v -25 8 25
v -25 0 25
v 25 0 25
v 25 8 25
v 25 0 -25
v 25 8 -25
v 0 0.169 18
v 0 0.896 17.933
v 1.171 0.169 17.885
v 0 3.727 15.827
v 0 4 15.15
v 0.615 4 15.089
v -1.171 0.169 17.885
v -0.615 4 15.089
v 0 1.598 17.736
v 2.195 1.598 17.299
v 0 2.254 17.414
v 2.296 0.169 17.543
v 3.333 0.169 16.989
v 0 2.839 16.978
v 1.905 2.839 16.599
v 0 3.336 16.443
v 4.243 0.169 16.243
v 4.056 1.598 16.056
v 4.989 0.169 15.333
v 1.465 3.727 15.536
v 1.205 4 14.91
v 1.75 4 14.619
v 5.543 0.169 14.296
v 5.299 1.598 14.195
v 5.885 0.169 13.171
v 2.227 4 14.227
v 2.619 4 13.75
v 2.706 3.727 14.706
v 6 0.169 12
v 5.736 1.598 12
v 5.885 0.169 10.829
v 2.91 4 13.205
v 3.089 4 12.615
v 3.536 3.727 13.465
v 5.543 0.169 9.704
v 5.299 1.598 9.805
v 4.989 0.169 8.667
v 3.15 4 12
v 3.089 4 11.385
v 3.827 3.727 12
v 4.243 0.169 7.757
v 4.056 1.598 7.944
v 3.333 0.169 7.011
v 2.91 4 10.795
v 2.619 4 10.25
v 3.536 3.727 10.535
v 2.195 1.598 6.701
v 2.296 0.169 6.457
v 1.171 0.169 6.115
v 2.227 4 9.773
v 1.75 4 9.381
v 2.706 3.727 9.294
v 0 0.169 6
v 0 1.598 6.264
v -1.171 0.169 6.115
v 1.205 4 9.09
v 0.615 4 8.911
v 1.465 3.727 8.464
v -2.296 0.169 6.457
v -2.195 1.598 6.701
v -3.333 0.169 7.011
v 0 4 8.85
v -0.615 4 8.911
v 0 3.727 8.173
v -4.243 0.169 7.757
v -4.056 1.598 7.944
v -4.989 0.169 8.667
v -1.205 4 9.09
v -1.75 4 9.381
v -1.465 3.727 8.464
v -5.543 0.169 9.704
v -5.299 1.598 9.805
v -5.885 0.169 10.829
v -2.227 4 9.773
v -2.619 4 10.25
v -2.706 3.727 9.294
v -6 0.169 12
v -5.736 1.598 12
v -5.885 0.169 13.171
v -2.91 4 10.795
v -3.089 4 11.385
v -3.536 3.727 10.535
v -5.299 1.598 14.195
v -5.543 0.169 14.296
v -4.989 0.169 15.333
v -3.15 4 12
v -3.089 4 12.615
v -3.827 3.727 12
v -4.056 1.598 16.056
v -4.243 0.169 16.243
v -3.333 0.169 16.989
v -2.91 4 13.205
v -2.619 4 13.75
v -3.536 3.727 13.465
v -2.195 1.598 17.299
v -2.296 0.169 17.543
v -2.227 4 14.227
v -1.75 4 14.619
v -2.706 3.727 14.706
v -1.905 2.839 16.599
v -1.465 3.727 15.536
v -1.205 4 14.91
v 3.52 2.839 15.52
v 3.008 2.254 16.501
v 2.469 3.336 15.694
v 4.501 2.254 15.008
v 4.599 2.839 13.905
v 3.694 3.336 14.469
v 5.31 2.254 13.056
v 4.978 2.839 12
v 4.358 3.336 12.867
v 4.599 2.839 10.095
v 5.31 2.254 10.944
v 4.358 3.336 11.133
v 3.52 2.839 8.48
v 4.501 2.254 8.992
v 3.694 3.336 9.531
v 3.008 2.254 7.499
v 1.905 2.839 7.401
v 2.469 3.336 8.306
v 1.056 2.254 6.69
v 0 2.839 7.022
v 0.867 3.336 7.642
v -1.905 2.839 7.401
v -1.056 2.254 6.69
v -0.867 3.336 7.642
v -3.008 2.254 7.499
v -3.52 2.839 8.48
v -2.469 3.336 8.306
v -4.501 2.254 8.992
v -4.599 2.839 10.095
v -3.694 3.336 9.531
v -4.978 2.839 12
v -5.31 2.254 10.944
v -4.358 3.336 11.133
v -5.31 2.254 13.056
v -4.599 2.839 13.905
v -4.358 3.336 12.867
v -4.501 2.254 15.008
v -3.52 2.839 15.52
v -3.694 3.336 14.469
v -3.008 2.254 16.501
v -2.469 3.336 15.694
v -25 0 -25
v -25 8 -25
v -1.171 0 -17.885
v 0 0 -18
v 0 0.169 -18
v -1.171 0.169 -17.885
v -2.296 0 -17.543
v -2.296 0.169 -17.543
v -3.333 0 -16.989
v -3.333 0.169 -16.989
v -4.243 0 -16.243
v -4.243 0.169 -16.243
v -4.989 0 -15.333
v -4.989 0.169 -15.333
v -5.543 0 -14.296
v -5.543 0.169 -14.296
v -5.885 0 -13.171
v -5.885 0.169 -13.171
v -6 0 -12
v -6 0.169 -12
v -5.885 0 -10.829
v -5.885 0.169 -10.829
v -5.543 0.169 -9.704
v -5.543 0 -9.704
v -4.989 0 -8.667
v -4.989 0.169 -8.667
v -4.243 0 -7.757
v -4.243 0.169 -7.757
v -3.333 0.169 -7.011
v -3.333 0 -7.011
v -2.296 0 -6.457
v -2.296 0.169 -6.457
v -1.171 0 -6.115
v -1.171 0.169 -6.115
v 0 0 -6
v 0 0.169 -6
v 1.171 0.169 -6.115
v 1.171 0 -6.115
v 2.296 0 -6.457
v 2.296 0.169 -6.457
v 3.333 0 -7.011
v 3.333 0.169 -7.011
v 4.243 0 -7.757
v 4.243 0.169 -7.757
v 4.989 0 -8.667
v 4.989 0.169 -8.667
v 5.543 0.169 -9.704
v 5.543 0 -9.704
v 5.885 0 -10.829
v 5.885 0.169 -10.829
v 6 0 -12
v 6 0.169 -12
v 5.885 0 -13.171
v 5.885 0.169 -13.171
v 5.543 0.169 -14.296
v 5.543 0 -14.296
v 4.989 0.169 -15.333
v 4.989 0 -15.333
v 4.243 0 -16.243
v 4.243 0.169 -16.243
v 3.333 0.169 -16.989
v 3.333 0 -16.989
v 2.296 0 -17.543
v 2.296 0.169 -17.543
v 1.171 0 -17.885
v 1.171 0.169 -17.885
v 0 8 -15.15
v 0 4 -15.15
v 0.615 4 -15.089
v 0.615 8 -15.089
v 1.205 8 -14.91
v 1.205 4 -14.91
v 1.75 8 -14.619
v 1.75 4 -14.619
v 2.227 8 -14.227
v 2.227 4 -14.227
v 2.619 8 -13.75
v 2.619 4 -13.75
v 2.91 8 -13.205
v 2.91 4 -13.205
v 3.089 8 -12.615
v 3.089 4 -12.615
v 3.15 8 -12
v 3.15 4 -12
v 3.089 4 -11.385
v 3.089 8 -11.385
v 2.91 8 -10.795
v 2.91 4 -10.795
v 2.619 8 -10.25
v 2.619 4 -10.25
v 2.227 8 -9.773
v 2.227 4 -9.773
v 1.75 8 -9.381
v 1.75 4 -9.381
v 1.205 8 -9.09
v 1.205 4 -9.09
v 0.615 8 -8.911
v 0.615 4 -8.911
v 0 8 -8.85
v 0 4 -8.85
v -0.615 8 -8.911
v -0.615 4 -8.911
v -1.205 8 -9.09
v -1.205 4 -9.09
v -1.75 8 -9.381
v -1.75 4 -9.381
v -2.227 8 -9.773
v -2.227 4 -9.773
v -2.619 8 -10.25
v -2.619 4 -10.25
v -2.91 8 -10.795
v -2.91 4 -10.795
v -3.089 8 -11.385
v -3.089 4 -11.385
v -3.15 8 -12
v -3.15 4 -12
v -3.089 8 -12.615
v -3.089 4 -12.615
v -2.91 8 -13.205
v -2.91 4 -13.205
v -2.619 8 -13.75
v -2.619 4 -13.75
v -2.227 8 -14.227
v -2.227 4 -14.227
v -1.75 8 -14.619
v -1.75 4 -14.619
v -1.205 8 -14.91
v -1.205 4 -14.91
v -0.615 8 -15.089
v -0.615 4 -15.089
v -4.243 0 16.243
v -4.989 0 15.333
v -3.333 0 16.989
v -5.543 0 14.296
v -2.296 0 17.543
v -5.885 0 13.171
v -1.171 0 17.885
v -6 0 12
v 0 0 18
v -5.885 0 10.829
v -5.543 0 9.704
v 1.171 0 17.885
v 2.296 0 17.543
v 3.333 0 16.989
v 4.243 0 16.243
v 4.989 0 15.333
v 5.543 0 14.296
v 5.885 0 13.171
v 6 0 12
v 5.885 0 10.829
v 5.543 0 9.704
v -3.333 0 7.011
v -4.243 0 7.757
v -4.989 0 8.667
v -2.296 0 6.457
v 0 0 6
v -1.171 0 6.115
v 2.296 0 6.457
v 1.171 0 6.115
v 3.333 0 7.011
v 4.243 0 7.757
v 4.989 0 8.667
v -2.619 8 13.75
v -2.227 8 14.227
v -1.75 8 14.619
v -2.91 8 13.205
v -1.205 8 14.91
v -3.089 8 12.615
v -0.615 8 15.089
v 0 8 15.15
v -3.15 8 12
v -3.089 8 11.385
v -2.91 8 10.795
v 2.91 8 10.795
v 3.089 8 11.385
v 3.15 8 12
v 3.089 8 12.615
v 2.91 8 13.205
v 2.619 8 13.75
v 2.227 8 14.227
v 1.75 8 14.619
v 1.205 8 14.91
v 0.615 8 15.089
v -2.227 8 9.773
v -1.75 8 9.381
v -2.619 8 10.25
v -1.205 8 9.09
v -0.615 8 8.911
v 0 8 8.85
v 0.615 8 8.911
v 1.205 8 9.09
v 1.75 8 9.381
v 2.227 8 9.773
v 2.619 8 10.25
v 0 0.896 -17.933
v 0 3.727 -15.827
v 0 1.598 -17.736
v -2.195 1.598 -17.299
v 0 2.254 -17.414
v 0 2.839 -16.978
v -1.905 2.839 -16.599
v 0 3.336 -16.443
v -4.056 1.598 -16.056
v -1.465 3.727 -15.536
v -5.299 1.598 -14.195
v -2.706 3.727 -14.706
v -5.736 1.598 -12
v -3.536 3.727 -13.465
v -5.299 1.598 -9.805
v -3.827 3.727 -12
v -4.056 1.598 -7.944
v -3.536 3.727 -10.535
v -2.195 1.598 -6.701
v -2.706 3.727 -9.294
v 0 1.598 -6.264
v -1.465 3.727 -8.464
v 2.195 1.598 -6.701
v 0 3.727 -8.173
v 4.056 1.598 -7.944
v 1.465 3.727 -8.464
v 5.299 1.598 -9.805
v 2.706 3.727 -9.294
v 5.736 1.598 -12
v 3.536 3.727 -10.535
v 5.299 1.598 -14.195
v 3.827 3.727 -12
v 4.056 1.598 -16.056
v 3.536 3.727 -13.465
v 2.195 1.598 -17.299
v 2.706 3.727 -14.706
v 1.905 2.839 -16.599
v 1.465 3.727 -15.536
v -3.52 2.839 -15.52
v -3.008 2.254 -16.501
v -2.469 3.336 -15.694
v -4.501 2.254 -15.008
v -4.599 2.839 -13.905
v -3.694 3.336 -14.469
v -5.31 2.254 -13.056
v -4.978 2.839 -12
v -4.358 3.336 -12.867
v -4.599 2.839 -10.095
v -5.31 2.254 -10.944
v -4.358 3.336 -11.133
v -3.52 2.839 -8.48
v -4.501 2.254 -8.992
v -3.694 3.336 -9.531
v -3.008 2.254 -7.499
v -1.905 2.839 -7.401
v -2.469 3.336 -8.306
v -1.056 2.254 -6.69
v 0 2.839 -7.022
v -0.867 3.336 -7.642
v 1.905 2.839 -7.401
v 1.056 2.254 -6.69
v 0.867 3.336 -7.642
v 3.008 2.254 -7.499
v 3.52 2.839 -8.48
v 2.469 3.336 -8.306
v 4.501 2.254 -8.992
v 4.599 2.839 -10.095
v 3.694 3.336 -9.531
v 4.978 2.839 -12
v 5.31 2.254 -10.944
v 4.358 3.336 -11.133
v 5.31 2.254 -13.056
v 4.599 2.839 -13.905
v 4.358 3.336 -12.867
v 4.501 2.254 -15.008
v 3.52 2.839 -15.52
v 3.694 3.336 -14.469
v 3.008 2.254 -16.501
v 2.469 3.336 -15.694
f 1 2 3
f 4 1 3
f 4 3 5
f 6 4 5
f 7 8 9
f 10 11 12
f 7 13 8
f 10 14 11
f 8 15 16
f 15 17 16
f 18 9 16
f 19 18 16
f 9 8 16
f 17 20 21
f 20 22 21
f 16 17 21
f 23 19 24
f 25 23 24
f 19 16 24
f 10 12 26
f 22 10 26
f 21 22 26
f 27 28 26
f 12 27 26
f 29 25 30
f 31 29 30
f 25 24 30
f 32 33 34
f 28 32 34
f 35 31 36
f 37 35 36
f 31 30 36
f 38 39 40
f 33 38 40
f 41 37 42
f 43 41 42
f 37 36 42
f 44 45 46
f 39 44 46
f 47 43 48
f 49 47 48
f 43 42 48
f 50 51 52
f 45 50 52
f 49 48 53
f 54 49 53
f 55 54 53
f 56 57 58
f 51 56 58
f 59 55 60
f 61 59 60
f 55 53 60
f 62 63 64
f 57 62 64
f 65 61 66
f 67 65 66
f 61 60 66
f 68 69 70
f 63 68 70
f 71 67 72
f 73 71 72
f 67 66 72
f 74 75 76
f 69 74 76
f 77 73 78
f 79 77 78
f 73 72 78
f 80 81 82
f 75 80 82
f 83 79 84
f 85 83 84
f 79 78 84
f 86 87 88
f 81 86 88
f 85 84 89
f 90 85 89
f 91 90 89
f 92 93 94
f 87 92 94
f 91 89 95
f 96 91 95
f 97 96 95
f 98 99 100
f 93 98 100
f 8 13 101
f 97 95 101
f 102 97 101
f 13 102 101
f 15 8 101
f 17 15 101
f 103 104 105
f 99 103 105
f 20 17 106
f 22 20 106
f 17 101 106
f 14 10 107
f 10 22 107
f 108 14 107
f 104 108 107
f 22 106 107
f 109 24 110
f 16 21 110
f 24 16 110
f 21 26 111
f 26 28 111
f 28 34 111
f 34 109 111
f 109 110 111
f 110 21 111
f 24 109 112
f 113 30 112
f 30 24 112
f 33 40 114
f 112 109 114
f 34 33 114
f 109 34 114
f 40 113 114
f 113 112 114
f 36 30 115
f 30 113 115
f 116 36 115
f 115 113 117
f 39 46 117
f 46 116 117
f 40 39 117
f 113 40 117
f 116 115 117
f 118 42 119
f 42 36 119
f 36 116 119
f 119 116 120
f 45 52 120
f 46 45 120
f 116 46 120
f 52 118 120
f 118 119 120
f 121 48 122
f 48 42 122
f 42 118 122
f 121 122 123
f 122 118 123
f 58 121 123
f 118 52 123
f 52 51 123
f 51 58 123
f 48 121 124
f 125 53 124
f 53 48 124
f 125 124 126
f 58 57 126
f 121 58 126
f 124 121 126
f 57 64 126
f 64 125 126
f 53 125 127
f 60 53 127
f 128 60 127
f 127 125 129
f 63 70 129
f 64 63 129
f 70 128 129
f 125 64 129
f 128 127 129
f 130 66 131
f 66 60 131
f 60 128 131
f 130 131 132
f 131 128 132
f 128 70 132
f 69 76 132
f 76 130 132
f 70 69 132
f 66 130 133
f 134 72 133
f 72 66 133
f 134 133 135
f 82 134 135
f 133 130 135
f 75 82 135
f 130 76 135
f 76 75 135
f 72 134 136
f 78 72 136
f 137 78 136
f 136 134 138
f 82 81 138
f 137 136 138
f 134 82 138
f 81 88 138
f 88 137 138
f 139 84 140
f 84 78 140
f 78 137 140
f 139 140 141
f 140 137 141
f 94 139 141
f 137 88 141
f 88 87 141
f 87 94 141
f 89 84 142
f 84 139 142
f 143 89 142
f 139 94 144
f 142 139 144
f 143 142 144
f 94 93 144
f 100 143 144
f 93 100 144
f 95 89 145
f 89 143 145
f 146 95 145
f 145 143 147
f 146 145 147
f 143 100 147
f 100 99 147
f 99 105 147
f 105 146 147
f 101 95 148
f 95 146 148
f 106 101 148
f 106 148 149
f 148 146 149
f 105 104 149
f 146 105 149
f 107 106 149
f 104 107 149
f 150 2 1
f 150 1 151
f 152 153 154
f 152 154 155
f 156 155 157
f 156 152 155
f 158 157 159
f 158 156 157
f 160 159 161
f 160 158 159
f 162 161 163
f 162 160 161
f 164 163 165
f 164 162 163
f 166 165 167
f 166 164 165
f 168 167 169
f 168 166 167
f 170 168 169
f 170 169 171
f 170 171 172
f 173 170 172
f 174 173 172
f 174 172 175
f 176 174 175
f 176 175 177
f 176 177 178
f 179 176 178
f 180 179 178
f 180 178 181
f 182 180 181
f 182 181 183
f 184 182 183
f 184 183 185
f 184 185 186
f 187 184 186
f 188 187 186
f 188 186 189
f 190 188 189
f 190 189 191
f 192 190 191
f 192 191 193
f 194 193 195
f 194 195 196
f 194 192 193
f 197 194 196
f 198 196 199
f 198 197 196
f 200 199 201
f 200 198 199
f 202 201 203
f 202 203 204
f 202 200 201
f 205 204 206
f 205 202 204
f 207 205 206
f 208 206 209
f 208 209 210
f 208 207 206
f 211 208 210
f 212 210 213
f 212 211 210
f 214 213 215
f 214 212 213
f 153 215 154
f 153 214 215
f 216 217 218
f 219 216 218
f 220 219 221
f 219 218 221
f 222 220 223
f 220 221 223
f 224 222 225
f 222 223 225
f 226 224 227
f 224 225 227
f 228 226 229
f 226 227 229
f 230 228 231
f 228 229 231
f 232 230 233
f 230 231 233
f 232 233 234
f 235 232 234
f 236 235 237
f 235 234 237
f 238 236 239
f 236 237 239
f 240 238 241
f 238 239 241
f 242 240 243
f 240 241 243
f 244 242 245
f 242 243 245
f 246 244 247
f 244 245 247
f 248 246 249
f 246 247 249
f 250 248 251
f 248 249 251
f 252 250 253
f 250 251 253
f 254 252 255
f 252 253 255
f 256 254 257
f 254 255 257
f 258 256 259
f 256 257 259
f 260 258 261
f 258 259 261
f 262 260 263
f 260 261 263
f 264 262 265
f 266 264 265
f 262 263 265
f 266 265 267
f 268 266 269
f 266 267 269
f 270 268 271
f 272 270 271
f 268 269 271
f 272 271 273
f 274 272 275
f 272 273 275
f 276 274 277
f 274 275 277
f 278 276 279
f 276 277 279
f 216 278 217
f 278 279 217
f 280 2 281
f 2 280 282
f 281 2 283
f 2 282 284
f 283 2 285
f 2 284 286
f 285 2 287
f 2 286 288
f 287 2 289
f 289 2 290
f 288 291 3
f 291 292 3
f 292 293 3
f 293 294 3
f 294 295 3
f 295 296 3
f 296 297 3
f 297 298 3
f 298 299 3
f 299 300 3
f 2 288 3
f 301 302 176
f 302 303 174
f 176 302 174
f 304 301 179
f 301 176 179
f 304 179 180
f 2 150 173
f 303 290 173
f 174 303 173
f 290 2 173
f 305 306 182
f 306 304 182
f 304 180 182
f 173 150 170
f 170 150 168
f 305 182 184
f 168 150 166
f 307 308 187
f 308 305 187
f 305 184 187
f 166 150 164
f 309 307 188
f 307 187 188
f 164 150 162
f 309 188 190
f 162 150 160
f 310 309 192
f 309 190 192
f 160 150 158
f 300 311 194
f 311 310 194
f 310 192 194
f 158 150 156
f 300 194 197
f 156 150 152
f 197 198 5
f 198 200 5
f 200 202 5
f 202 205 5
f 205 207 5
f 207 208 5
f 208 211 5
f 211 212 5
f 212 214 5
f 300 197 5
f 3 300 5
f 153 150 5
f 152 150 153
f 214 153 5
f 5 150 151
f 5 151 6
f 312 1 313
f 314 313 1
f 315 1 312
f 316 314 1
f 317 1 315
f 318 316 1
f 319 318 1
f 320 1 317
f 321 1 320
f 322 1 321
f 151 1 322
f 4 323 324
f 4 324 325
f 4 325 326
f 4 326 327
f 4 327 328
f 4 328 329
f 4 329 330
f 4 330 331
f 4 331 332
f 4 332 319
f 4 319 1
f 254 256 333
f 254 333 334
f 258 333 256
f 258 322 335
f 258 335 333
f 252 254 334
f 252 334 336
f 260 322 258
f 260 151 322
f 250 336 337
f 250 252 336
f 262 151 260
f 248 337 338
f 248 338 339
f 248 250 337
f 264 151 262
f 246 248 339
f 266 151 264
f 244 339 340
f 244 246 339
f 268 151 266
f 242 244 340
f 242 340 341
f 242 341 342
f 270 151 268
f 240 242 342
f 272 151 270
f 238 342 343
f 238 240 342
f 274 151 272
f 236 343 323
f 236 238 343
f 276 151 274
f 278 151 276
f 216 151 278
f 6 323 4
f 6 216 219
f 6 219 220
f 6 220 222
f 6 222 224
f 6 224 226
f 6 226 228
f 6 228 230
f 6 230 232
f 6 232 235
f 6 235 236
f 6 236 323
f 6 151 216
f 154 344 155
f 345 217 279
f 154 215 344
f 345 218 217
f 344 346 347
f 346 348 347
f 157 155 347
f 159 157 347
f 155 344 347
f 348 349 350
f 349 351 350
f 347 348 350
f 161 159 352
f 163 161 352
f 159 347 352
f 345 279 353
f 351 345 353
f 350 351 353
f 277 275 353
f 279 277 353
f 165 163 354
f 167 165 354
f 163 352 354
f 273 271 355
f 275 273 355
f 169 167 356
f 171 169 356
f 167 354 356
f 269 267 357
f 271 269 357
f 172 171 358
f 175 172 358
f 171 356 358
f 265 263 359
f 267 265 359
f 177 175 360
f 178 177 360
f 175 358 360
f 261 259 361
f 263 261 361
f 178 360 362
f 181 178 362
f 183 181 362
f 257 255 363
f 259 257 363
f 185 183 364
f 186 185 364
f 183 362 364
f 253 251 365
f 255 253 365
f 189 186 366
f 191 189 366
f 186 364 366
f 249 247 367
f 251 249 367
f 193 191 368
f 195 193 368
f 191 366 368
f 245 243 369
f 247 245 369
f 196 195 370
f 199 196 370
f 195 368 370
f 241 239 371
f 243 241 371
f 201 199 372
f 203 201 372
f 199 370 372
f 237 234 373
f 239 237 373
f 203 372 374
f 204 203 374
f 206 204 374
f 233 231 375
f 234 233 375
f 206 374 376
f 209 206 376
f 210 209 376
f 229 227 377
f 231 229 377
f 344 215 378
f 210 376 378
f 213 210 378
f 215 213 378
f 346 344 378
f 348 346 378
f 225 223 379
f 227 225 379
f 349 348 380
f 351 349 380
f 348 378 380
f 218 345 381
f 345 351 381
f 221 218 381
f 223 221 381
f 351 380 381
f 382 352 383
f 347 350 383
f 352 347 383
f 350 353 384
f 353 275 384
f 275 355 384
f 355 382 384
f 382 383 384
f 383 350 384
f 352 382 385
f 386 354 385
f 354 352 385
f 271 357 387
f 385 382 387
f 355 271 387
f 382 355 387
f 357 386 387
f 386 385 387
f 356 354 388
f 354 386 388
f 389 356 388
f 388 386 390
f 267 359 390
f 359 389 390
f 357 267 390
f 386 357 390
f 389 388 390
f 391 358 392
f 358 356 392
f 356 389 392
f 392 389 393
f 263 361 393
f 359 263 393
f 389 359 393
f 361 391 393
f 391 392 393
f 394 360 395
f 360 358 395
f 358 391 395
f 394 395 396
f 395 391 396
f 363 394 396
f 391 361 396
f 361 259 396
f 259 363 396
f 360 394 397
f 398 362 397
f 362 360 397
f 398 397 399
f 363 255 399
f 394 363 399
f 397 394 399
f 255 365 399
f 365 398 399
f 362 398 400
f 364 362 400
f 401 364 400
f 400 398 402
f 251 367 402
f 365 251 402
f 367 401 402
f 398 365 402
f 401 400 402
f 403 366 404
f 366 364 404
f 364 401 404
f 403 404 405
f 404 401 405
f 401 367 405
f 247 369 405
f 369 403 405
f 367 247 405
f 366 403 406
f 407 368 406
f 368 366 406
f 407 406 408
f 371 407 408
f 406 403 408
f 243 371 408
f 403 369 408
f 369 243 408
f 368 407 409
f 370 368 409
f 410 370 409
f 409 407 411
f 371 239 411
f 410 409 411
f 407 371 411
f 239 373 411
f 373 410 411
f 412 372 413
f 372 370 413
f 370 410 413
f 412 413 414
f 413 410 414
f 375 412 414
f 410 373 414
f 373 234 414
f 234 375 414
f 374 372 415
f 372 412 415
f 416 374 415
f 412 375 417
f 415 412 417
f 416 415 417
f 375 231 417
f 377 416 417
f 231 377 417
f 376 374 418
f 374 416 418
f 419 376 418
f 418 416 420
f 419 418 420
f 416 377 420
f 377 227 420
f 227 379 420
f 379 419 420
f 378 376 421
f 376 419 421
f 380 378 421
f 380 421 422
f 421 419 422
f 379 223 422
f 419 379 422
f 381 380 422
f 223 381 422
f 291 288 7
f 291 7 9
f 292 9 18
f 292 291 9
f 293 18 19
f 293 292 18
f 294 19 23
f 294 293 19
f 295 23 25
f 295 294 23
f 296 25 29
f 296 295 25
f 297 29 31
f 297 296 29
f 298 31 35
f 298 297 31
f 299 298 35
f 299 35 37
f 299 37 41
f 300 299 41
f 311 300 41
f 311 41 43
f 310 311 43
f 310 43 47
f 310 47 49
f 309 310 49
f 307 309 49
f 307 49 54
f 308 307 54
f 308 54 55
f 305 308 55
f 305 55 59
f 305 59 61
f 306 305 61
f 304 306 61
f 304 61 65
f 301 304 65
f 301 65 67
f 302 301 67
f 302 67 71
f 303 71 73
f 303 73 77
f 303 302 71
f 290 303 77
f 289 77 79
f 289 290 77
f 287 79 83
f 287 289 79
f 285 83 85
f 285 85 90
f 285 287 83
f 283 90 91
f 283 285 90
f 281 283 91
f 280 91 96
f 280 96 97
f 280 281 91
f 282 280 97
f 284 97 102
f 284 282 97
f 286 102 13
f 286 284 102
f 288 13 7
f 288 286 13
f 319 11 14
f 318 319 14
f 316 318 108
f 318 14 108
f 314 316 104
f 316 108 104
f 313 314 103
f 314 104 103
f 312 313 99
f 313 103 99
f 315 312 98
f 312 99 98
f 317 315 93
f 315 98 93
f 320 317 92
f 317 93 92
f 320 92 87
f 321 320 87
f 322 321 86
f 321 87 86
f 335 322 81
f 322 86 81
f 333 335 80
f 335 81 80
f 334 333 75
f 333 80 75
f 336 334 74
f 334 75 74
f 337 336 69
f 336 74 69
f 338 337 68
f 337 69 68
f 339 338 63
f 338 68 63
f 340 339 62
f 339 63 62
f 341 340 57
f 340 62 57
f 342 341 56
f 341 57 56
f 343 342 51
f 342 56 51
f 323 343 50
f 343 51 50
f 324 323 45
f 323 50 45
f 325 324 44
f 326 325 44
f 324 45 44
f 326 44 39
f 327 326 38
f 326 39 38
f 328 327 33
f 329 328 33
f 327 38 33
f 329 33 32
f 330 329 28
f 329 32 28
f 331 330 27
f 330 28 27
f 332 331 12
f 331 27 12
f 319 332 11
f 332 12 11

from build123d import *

# Parameters (mm, degrees)
SKETCH1_W           = 50
SKETCH1_H           = 50
BOSS_EXTRUDE1_DEPTH = 8
SKETCH2_R           = 6
CUT_EXTRUDE2_DEPTH  = 4
SKETCH4_R           = 3.15
CUT_EXTRUDE3_DEPTH  = 4
FILLET1_R           = 4


with BuildPart() as part:
    # Sketch1 → Boss-Extrude1 (new body)
    with BuildSketch(Plane(origin=(0, 0, 0), x_dir=(1, 0, 0), z_dir=(0, 1, 0))):
        Rectangle(SKETCH1_W, SKETCH1_H)
    extrude(amount=BOSS_EXTRUDE1_DEPTH)

    # Sketch2 → Cut-Extrude2 (cut)
    with BuildSketch(Plane(origin=(0, 0, 0), x_dir=(1, 0, 0), z_dir=(0, 1, 0))):
        with Locations(Location((0, -12, 0), (0, 0, 270))):
            Circle(SKETCH2_R)
        with Locations(Location((0, 12, 0), (0, 0, 90))):
            Circle(SKETCH2_R)
    extrude(amount=CUT_EXTRUDE2_DEPTH, mode=Mode.SUBTRACT)

    # Sketch4 → Cut-Extrude3 (cut)
    with BuildSketch(Plane.XZ.offset(-4)):
        with Locations(Location((0, -12, 0), (0, 0, 270))):
            Circle(SKETCH4_R)
        with Locations(Location((0, 12, 0), (0, 0, 90))):
            Circle(SKETCH4_R)
    extrude(amount=-CUT_EXTRUDE3_DEPTH, mode=Mode.SUBTRACT)

    # Fillet1
    # the kernel refuses this fillet: 4 mm, written as the material it adds along each edge
    with BuildSketch(Plane(origin=(0, 4, 12), x_dir=(0, 0, 1), z_dir=(-1, 0, 0))) as fillet1_piece_1:
        with BuildLine():
            CenterArc((2, -3.831122551), FILLET1_R, 0, 73.291656284)
            Line((3.15, 0), (3.173, 0.076622451))
            ThreePointArc((3.173, 0.076622451), (4.575, 0.08), (6, 0.08))
            Line((6, 0.08), (6.08, 0))
            Line((6.08, 0), (6.08, -3.831122551))
            Line((6.08, -3.831122551), (6, -3.831122551))
        make_face()
    revolve(axis=Axis((0, 4, 12), (0, 1, 0)))
    with BuildSketch(Plane(origin=(0, 4, -12), x_dir=(0, 0, -1), z_dir=(1, 0, 0))) as fillet1_piece_2:
        with BuildLine():
            CenterArc((2, -3.831122551), FILLET1_R, 0, 73.291656284)
            Line((3.15, 0), (3.173, 0.076622451))
            ThreePointArc((3.173, 0.076622451), (4.575, 0.08), (6, 0.08))
            Line((6, 0.08), (6.08, 0))
            Line((6.08, 0), (6.08, -3.831122551))
            Line((6.08, -3.831122551), (6, -3.831122551))
        make_face()
    revolve(axis=Axis((0, 4, -12), (0, 1, 0)))


solid = part.part
